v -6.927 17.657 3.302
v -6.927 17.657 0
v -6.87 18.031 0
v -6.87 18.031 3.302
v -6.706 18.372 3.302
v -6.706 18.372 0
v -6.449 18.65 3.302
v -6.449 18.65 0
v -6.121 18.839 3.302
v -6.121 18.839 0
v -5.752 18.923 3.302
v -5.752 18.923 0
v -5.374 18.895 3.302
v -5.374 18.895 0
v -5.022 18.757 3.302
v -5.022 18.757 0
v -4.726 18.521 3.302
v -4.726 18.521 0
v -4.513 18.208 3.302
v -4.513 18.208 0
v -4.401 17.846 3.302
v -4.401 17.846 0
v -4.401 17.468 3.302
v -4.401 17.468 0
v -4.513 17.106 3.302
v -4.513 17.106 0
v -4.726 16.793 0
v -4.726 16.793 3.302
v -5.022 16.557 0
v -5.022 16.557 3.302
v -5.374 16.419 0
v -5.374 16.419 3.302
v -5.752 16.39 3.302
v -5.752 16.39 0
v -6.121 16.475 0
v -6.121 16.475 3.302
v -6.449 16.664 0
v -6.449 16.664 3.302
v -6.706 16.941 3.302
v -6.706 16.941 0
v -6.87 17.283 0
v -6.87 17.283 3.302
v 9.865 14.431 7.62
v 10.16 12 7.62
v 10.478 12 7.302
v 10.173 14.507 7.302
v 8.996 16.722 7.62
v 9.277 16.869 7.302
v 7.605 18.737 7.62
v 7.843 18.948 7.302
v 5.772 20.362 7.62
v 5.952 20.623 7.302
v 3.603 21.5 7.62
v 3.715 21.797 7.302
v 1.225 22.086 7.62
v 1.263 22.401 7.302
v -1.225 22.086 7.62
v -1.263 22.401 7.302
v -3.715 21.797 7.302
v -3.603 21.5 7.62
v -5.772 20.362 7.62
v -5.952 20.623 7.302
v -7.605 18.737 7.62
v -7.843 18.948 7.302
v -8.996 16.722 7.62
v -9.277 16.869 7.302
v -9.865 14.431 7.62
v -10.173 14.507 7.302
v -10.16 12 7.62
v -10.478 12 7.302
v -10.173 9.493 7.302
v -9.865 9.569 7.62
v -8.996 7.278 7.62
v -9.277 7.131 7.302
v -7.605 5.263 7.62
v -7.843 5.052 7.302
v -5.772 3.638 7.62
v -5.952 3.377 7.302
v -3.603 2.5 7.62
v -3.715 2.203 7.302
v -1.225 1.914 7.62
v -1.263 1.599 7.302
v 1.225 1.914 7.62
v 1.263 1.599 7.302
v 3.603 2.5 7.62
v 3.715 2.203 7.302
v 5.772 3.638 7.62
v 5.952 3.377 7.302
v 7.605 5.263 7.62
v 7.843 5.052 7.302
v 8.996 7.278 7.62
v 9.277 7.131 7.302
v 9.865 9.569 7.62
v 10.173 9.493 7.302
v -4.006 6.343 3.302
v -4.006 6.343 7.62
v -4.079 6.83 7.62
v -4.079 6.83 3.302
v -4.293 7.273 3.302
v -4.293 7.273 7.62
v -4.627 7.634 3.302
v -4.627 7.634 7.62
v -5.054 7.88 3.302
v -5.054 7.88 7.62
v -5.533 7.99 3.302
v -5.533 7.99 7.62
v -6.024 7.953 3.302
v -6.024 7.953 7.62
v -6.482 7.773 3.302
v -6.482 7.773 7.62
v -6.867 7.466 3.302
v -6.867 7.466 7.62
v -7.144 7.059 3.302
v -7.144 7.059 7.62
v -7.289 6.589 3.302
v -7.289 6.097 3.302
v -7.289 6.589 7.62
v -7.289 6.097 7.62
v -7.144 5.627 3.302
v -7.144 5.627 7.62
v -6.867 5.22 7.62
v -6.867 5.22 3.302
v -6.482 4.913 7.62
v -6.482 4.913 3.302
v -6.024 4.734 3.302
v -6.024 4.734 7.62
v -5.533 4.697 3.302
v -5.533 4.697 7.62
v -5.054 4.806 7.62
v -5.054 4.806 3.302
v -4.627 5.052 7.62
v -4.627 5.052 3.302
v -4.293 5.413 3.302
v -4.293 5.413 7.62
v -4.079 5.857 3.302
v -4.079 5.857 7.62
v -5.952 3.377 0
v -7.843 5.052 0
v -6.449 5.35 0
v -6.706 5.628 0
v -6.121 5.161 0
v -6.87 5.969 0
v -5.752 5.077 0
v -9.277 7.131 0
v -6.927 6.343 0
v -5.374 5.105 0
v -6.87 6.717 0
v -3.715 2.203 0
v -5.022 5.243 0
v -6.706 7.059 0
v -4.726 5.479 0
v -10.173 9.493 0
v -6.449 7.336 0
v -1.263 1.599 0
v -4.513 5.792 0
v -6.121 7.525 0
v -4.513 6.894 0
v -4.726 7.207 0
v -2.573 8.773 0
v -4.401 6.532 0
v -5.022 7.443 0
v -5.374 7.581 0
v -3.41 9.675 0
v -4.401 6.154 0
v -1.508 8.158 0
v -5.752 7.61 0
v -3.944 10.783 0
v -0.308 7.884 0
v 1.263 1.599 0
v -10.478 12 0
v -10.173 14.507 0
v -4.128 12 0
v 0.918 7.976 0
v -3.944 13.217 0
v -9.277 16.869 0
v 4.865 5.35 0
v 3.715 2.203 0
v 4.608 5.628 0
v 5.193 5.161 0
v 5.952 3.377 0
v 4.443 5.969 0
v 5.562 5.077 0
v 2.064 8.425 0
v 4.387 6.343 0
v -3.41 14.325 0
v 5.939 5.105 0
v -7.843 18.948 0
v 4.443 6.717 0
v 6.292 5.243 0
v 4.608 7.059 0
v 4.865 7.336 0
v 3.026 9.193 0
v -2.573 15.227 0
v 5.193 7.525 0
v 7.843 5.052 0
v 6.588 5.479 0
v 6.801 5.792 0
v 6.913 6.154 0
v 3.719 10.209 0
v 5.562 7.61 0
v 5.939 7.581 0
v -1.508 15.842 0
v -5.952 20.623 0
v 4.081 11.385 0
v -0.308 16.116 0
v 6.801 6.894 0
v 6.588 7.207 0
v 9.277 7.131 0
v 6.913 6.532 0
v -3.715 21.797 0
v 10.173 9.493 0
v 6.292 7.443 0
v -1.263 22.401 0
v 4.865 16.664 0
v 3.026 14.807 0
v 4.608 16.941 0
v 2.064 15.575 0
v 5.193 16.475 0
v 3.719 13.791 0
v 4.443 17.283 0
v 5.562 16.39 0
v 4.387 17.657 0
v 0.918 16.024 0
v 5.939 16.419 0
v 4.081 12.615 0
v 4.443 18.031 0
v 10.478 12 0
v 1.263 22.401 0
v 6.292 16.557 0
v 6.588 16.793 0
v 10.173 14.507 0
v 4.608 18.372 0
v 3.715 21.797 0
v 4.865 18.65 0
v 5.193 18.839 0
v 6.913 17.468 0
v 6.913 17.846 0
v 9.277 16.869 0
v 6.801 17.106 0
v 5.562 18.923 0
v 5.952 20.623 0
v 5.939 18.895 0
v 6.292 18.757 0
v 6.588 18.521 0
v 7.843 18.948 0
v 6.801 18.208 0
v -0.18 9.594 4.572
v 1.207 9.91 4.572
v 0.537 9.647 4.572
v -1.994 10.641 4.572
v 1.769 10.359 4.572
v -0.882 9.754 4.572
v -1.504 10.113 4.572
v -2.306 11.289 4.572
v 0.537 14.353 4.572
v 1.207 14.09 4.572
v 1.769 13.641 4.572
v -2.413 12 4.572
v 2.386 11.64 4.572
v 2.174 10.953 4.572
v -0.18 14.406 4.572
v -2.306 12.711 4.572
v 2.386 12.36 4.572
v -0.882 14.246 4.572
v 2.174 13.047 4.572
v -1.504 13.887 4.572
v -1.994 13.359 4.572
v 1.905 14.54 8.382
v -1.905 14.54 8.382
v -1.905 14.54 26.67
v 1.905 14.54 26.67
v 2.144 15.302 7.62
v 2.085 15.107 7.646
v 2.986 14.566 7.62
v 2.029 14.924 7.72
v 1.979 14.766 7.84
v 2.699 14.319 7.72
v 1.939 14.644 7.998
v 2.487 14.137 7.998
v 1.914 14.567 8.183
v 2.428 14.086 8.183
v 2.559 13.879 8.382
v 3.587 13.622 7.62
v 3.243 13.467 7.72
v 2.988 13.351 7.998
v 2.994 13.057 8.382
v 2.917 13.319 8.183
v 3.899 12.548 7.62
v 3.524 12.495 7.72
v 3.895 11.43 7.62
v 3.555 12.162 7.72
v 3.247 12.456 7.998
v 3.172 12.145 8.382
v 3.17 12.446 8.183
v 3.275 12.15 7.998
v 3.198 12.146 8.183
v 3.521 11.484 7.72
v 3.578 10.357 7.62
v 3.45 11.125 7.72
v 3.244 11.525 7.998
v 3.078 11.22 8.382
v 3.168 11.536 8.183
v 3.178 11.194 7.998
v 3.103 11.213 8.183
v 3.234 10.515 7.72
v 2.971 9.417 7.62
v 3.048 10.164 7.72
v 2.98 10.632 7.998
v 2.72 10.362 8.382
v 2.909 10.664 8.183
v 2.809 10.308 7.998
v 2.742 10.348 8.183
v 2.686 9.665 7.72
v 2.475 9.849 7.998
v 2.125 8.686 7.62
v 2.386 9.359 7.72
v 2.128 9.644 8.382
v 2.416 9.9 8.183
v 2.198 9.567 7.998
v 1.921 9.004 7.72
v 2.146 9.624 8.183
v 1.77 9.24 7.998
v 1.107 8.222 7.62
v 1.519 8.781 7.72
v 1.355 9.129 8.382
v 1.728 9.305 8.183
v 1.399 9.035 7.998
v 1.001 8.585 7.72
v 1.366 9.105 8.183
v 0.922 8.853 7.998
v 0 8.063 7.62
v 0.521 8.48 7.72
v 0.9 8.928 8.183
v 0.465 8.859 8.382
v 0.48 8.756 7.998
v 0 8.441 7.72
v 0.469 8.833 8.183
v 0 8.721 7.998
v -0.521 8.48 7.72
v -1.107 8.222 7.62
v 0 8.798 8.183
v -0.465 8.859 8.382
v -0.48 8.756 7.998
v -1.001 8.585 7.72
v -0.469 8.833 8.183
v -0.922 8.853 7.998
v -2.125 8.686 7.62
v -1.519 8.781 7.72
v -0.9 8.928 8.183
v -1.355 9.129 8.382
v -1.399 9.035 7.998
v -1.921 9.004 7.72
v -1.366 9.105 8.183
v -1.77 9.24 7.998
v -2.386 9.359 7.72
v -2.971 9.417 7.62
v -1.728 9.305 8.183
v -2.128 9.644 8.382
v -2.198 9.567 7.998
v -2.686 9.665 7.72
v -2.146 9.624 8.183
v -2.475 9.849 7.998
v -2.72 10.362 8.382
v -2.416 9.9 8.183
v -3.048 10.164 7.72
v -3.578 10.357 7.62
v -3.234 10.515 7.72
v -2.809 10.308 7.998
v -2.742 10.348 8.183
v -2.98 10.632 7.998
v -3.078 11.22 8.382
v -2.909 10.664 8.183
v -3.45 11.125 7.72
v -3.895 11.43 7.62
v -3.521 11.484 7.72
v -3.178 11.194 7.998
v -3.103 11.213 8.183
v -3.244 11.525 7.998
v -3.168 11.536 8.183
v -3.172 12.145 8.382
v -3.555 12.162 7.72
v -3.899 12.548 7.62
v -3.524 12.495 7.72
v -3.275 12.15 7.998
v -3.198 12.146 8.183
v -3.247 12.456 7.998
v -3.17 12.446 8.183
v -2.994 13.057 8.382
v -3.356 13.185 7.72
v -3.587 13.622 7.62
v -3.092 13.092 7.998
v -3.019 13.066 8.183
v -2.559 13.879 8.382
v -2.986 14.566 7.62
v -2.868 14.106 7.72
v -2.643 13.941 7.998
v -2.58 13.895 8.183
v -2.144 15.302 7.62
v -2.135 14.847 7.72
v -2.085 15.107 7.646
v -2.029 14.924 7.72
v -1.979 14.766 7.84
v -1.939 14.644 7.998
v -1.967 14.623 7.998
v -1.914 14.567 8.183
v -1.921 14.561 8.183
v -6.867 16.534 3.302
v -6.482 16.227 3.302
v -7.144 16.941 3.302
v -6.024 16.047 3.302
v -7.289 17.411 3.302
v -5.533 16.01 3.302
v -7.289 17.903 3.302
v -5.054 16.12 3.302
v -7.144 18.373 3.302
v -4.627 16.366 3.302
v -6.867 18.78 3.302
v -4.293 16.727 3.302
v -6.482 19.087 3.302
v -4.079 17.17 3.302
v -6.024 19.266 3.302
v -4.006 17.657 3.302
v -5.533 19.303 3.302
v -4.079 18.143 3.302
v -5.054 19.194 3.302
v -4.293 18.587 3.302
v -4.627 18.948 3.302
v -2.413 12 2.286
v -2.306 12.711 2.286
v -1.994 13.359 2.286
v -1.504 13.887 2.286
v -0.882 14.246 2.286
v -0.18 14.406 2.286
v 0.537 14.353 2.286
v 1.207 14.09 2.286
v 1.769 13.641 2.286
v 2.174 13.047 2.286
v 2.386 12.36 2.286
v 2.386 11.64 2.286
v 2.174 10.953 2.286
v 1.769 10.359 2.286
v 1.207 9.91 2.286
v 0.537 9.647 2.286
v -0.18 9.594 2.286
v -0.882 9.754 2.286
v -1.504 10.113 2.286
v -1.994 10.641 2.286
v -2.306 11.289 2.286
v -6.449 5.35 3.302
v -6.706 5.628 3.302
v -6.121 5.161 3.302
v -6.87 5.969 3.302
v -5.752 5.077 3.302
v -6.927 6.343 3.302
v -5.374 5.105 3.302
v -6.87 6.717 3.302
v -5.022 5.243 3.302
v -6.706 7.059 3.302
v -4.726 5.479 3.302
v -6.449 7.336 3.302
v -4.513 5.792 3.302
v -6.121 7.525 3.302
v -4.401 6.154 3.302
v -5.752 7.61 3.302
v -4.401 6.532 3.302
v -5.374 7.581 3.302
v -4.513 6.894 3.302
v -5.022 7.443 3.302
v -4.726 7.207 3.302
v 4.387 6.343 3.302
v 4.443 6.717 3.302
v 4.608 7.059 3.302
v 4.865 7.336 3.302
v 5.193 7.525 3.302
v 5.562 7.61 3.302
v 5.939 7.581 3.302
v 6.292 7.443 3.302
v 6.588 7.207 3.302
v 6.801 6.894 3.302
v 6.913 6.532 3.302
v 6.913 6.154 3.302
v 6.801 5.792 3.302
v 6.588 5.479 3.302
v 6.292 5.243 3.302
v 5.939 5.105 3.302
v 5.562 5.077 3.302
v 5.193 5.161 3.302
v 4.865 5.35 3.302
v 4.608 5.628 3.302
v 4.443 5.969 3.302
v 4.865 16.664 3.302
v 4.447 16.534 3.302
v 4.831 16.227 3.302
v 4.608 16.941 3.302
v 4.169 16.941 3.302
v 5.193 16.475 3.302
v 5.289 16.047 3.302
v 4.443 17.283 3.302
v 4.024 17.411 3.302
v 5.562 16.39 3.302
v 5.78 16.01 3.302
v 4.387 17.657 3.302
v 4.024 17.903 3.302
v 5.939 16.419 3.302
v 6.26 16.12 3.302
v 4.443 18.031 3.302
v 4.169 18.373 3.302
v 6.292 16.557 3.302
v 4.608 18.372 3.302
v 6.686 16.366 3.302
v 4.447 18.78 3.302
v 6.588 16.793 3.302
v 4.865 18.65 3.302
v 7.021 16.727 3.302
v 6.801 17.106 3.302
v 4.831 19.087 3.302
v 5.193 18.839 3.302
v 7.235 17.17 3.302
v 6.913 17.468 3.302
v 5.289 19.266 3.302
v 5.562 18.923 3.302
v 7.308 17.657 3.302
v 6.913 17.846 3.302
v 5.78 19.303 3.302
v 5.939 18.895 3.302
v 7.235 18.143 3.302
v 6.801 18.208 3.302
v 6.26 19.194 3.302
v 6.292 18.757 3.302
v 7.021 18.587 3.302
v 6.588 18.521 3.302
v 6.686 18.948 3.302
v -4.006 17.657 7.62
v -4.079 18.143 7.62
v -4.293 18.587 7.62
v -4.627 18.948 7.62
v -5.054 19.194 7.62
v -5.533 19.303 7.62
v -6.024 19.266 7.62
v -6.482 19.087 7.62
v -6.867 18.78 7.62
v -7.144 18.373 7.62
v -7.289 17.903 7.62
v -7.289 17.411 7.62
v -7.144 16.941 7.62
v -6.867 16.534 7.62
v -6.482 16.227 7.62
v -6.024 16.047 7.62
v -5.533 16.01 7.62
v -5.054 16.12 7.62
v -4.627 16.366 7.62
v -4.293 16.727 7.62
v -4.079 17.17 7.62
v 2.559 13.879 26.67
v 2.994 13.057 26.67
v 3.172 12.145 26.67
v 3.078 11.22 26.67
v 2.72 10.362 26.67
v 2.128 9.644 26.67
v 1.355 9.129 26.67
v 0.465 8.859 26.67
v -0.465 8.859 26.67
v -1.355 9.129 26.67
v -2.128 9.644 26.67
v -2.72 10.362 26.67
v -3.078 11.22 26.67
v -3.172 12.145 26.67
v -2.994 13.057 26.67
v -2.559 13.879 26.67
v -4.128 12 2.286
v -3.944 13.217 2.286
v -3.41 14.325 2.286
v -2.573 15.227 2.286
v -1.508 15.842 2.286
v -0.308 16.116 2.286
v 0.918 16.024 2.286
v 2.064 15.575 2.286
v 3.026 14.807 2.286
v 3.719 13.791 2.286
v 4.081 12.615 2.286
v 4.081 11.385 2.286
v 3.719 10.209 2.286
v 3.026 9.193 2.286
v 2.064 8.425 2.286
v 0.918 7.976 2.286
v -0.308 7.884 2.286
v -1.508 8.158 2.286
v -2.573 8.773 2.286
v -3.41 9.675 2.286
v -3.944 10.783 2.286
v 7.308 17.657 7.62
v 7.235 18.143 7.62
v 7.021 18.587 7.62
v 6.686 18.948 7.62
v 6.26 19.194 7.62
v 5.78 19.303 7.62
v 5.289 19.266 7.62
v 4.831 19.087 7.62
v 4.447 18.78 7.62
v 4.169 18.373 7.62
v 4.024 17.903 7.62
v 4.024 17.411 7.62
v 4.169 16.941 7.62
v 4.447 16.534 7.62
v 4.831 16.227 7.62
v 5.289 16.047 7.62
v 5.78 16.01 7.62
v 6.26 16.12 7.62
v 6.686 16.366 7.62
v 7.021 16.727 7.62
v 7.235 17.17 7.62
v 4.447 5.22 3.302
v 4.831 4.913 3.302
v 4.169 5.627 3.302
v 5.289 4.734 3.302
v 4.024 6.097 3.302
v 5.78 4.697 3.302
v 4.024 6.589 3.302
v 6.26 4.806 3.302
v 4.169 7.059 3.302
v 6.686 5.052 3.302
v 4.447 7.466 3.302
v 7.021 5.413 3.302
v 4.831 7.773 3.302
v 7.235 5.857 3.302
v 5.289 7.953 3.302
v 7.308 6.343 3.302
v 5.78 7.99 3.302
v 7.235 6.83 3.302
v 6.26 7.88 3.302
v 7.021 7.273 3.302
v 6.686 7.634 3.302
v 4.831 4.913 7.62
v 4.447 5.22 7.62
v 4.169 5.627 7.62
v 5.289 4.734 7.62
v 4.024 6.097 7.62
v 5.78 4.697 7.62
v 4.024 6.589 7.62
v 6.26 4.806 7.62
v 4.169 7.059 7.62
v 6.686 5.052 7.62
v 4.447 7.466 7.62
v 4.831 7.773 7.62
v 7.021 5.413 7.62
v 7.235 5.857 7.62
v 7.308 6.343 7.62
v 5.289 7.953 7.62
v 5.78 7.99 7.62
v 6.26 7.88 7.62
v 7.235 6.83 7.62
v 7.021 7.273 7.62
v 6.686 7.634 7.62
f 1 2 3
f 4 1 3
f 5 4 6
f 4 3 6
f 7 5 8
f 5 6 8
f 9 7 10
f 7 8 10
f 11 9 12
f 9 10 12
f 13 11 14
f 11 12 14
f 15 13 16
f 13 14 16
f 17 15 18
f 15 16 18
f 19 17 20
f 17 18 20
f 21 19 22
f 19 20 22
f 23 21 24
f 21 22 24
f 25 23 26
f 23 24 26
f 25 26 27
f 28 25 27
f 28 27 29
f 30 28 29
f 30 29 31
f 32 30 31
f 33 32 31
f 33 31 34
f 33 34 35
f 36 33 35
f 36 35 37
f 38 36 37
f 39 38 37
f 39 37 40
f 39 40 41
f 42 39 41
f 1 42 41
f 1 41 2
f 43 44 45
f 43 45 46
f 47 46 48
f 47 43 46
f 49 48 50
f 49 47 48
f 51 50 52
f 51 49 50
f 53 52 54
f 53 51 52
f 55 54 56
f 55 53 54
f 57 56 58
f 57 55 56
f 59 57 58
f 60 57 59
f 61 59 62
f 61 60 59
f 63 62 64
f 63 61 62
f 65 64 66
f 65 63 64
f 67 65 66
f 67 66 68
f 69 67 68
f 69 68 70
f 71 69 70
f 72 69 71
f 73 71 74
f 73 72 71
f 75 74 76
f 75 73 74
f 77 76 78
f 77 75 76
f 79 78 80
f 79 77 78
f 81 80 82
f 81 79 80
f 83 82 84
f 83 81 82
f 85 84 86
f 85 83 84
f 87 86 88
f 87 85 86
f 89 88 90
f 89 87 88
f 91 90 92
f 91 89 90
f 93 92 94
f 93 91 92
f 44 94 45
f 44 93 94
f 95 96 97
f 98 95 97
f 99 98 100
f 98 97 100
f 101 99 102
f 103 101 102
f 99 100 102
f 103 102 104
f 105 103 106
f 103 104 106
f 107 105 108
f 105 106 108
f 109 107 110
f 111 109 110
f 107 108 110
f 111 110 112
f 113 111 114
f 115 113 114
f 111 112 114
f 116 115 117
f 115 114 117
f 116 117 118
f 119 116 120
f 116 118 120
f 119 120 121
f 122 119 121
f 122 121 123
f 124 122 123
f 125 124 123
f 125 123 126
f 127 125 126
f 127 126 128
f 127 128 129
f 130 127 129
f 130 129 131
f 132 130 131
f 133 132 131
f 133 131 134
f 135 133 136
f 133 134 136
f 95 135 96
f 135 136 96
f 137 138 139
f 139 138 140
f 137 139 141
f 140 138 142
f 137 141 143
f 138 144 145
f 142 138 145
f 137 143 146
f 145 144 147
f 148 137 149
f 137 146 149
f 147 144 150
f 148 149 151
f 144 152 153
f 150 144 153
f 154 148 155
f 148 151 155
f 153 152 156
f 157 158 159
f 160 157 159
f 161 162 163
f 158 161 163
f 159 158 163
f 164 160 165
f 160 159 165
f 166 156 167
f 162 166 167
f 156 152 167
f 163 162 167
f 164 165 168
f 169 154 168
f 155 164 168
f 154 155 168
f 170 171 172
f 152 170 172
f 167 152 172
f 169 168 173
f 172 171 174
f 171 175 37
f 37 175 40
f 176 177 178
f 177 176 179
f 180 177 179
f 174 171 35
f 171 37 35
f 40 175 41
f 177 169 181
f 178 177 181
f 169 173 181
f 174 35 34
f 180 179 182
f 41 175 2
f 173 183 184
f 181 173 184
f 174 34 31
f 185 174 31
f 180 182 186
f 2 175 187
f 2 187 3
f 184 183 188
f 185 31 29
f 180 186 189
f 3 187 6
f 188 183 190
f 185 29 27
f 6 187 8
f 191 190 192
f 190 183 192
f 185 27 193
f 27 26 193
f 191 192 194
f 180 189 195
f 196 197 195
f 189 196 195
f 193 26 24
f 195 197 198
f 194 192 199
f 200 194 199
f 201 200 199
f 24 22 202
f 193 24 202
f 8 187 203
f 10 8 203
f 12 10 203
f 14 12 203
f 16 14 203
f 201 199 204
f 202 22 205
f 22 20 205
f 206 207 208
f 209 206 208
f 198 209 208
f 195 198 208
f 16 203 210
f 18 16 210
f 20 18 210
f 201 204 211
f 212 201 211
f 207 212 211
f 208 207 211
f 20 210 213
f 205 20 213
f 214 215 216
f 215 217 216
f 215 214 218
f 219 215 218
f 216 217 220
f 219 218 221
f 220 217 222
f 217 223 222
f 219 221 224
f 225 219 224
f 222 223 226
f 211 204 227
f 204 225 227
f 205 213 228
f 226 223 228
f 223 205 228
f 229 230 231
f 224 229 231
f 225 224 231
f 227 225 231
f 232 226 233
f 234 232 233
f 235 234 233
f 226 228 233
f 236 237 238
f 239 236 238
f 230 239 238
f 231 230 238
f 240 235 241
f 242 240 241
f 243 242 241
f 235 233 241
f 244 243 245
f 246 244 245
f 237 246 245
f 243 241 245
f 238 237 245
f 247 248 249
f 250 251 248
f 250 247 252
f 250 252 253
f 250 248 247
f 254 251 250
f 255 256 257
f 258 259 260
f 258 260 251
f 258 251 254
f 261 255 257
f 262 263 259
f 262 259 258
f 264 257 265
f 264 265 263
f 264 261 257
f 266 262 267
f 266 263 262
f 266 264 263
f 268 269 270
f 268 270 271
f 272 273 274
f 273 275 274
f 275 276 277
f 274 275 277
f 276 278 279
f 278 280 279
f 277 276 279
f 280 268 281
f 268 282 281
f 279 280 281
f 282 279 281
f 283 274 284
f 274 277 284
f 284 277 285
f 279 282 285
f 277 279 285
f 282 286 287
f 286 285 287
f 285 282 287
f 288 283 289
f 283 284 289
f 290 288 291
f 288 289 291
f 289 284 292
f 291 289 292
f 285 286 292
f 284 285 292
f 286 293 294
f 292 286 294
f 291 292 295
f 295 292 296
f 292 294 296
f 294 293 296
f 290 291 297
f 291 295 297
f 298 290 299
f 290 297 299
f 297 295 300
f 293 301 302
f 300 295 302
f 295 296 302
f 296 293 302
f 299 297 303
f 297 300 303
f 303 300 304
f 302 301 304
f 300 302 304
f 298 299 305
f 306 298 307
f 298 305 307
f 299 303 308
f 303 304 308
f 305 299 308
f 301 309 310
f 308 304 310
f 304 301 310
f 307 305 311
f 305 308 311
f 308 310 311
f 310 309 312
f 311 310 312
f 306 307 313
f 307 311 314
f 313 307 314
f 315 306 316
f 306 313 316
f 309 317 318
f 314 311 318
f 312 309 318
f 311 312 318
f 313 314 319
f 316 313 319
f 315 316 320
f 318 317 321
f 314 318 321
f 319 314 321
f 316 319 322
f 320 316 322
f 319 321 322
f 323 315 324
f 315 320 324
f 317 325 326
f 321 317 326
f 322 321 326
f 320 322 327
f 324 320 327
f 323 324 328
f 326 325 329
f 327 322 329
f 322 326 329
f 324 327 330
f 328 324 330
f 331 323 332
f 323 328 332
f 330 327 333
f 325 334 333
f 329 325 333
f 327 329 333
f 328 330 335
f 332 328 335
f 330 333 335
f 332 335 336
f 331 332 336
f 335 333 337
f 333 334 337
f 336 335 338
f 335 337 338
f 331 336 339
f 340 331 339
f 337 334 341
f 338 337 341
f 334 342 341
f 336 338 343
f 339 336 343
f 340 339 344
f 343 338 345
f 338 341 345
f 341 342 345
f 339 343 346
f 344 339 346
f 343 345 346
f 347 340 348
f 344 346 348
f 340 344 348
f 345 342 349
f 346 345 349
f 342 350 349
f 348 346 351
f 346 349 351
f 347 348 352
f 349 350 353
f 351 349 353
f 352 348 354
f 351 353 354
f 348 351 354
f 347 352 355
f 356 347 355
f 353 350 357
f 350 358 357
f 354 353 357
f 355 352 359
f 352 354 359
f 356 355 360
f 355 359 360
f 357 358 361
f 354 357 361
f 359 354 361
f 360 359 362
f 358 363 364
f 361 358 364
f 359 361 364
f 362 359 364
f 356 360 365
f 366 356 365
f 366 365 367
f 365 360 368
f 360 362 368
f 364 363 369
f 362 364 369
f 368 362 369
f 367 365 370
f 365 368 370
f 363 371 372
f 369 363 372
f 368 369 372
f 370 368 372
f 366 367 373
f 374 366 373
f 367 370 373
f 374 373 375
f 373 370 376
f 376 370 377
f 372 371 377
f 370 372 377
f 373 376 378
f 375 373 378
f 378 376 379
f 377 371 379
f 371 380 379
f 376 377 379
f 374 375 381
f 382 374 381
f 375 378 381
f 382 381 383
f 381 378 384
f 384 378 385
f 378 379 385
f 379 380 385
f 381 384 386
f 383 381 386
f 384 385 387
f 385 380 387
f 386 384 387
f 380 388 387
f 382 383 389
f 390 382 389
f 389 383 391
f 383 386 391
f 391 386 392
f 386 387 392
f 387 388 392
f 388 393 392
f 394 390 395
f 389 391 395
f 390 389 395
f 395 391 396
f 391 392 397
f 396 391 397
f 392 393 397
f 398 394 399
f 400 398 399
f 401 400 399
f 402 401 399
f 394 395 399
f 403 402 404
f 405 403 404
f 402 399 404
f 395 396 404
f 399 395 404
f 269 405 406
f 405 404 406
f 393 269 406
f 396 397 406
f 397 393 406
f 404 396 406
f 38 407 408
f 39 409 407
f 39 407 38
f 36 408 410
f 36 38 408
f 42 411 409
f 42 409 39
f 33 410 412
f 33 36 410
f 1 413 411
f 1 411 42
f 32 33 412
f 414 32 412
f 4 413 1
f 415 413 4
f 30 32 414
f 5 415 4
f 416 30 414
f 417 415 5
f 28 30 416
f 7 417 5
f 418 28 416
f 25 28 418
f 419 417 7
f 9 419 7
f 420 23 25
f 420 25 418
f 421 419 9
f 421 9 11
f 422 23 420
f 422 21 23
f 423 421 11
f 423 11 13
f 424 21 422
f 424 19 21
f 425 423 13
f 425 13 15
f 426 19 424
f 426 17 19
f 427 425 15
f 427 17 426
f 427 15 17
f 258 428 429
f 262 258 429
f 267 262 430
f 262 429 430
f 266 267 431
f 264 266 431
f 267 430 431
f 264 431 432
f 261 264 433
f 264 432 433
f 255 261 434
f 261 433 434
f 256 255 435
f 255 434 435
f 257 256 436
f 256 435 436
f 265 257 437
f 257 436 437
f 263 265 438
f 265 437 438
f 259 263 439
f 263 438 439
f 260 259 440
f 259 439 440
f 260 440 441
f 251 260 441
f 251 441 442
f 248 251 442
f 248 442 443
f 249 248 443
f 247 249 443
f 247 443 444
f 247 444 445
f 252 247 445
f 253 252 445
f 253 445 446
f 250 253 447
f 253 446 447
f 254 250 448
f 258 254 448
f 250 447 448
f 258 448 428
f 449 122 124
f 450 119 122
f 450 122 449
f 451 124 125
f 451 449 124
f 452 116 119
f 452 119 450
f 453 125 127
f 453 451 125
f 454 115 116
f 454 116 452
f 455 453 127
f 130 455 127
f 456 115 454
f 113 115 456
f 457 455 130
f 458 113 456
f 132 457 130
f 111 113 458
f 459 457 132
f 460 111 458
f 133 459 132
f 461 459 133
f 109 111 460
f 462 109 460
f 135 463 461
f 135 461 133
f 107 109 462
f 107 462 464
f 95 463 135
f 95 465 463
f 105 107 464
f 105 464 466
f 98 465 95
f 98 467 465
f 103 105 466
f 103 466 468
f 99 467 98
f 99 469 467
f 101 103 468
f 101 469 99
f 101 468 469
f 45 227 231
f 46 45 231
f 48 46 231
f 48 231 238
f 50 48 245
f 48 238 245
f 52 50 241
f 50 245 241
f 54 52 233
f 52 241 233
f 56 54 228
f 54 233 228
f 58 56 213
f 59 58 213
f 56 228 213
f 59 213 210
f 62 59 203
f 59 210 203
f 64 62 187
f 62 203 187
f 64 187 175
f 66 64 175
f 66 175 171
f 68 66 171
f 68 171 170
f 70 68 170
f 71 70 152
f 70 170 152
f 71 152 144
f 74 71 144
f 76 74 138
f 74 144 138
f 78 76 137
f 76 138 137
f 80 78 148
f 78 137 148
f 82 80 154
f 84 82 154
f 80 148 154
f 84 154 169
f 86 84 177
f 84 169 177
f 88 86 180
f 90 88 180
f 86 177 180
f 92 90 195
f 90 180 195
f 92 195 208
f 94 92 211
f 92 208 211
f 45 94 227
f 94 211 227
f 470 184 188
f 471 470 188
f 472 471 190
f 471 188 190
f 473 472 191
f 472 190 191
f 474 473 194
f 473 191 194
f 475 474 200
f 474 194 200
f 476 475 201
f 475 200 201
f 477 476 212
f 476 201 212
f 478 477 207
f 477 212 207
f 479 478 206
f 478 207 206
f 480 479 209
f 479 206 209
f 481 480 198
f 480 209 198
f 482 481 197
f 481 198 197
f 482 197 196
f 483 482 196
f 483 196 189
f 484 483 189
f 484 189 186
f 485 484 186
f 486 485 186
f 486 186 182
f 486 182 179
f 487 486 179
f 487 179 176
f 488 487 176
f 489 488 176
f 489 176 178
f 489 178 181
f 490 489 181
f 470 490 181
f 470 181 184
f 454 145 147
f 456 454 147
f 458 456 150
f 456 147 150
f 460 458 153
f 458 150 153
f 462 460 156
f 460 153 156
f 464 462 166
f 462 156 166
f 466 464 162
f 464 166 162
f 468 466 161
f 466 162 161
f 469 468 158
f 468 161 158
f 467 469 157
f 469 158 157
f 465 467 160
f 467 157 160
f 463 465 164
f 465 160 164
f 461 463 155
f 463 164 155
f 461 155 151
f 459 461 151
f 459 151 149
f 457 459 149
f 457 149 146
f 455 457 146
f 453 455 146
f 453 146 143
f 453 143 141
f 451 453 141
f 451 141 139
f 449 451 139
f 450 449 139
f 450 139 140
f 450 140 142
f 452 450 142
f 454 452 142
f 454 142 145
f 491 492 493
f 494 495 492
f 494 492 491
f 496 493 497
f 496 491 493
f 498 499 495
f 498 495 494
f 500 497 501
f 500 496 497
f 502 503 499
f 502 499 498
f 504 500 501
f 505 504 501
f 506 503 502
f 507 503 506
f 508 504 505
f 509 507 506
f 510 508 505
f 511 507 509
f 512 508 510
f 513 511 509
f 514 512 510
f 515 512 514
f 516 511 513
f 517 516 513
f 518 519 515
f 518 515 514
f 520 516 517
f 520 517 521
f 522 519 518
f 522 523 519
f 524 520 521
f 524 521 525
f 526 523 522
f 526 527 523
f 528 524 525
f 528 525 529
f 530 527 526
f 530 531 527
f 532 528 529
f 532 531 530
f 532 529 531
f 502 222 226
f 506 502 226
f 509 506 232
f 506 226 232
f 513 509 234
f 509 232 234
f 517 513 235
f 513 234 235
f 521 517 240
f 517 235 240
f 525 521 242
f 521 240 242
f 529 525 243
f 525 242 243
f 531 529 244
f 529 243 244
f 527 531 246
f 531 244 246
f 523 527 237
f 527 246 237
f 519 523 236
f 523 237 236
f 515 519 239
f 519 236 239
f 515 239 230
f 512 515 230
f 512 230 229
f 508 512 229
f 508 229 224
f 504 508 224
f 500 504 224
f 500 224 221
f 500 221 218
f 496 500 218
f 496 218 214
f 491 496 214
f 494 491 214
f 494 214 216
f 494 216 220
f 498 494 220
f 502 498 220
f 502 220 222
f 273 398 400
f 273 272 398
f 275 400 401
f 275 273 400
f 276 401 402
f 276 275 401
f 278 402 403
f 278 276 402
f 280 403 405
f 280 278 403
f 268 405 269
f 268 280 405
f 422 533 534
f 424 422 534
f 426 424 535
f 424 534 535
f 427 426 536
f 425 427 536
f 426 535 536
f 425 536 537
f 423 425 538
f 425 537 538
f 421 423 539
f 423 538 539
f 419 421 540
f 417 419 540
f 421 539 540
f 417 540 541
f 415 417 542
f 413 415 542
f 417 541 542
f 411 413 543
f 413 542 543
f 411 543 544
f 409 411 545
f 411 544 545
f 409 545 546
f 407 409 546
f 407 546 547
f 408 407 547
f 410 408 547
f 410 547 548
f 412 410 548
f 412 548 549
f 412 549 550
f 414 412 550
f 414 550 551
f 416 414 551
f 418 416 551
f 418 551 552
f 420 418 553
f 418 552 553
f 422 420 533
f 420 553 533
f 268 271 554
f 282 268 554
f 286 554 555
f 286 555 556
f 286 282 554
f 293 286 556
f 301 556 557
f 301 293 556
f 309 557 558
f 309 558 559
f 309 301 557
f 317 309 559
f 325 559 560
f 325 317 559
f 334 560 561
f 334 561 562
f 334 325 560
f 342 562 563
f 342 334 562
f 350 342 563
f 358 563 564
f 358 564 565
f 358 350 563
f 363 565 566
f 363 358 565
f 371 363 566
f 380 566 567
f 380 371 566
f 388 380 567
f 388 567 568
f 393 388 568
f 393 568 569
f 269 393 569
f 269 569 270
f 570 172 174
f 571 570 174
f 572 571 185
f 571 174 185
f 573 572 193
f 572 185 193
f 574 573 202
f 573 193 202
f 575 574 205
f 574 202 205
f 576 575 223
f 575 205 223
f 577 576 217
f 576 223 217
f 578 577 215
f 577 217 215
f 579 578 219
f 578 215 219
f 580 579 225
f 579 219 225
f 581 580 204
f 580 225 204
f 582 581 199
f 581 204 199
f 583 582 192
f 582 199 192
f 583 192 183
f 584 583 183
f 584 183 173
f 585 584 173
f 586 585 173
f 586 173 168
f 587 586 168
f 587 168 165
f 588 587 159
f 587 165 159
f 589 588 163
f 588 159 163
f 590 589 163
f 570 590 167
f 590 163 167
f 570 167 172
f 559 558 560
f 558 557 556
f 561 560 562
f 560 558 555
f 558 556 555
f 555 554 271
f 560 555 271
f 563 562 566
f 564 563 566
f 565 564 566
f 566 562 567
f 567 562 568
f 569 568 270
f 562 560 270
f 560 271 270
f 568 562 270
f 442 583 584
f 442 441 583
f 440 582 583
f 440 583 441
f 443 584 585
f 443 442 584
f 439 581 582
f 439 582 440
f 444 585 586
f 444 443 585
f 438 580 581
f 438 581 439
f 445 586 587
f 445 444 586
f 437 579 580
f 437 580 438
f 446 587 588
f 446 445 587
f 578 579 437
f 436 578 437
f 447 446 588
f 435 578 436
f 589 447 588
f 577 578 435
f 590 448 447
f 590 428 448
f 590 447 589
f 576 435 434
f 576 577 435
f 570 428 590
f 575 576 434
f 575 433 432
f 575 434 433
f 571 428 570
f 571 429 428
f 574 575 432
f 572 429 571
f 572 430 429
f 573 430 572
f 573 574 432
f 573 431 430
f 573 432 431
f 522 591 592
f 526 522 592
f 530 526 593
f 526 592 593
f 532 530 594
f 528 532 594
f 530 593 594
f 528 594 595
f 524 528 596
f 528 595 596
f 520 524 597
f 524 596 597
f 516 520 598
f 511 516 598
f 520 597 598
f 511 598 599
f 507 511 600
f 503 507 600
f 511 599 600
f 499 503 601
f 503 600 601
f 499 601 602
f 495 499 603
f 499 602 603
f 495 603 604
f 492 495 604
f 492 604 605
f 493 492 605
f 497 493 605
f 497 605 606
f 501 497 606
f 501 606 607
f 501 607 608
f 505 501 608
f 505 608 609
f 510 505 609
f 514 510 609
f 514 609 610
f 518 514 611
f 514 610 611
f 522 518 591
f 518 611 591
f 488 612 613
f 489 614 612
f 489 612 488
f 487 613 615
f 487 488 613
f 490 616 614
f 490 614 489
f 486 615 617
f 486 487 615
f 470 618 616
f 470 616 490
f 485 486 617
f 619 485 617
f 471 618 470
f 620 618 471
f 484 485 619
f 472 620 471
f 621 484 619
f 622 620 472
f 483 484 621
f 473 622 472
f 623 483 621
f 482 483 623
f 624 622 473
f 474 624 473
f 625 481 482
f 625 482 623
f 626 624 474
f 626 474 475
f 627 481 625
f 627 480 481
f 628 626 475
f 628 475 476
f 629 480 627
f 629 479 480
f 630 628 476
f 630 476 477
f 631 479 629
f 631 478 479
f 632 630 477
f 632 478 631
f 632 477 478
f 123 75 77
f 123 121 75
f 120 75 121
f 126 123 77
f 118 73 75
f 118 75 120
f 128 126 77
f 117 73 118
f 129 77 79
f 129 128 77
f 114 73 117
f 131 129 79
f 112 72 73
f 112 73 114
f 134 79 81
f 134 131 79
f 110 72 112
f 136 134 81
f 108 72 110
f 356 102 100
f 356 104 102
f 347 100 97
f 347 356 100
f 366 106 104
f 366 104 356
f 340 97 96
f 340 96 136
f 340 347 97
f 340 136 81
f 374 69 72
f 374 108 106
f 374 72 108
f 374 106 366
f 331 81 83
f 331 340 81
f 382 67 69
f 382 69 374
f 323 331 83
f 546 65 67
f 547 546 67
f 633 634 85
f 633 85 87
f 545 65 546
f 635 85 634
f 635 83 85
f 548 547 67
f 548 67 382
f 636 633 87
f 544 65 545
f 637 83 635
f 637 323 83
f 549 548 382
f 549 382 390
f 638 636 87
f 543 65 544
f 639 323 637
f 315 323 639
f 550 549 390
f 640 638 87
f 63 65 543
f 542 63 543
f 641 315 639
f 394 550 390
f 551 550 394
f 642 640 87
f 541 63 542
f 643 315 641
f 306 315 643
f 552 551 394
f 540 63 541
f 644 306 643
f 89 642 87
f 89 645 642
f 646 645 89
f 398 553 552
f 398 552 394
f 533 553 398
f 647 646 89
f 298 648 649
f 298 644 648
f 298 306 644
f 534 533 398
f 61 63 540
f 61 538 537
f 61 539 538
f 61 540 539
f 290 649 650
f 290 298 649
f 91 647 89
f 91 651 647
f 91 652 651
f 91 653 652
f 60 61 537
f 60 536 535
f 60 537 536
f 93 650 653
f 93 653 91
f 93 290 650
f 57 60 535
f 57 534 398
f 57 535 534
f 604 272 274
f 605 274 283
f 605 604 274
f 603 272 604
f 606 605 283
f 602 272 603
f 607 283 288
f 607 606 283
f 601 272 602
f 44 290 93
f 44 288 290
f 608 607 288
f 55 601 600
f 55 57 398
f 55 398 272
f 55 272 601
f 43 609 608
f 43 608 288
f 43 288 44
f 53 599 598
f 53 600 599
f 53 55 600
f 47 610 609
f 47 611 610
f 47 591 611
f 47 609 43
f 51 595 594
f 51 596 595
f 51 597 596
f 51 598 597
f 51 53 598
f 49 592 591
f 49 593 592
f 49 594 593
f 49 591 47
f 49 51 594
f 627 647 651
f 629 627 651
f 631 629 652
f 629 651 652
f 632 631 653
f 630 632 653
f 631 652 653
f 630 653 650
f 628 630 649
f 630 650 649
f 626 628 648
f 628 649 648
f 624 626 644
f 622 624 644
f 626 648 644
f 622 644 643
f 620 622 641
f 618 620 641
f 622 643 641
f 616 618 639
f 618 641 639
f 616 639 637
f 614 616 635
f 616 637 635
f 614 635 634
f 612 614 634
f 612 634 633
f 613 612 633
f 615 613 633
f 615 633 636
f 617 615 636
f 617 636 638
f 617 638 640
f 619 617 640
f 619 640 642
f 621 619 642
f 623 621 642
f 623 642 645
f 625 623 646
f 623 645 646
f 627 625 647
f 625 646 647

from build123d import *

# Parameters (mm, degrees)
ESQUISSE1_R                  = 10.4775
BOSS_EXTRU_1_DEPTH           = 7.62
ESQUISSE3_R                  = 4.1275
ENL_V_MAT_EXTRU_1_DEPTH      = 2.286
ESQUISSE4_R                  = 2.413
ENL_V_MAT_EXTRU_2_DEPTH      = 2.286
BOSS_EXTRU_2_DEPTH           = 19.05
ESQUISSE6_R                  = 1.27
ENL_V_MAT_EXTRU_3_DEPTH      = 1
ENL_V_MAT_EXTRU_3_DEPTH_BACK = 27.67
ESQUISSE7_R                  = 1.651
ENL_V_MAT_EXTRU_4_DEPTH      = 4.318
CHANFREIN1_SIZE              = 0.3175
CONG_1_R                     = 0.762


with BuildPart() as part:
    # Esquisse1 → Boss.-Extru.1 (new body)
    with BuildSketch(Plane.XY):
        with Locations((0, 12)):
            Circle(ESQUISSE1_R)
    extrude(amount=BOSS_EXTRU_1_DEPTH)

    # Esquisse3 → Enlèv. mat.-Extru.1 (cut)
    with BuildSketch(Plane(origin=(0, 0, 0), x_dir=(-1, 0, 0), z_dir=(0, 0, -1))):
        with Locations((0, 12)):
            Circle(ESQUISSE3_R)
    extrude(amount=-ENL_V_MAT_EXTRU_1_DEPTH, mode=Mode.SUBTRACT)

    # Esquisse4 → Enlèv. mat.-Extru.2 (cut)
    with BuildSketch(Plane(origin=(0, 0, 2.286), x_dir=(-1, 0, 0), z_dir=(0, 0, -1))):
        with Locations((0, 12)):
            Circle(ESQUISSE4_R)
    extrude(amount=-ENL_V_MAT_EXTRU_2_DEPTH, mode=Mode.SUBTRACT)

    # Esquisse5 → Boss.-Extru.2 (add)
    with BuildSketch(Plane.XY.offset(7.62)):
        with BuildLine():
            Line((-1.905, 14.54), (1.905, 14.54))
            ThreePointArc((1.905, 14.54), (0, 8.825), (-1.905, 14.54))
        make_face()
    extrude(amount=BOSS_EXTRU_2_DEPTH)

    # Esquisse6 → Enlèv. mat.-Extru.3 (cut, two sides)
    with BuildSketch(Plane(origin=(0, 0, 0), x_dir=(-1, 0, 0), z_dir=(0, 0, -1))) as enl_v_mat_extru_3_sk:
        with Locations((-5.656854249, 17.656854249)):
            Circle(ESQUISSE6_R)
        with Locations((5.656854249, 17.656854249)):
            Circle(ESQUISSE6_R)
        with Locations((5.656854249, 6.343145751)):
            Circle(ESQUISSE6_R)
        with Locations((-5.656854249, 6.343145751)):
            Circle(ESQUISSE6_R)
    extrude(amount=ENL_V_MAT_EXTRU_3_DEPTH, mode=Mode.SUBTRACT)
    extrude(enl_v_mat_extru_3_sk.sketch, amount=-ENL_V_MAT_EXTRU_3_DEPTH_BACK, mode=Mode.SUBTRACT)

    # Esquisse7 → Enlèv. mat.-Extru.4 (cut)
    with BuildSketch(Plane.XY.offset(7.62)):
        with Locations((-5.656854249, 17.656854249)):
            Circle(ESQUISSE7_R)
        with Locations((5.656854249, 17.656854249)):
            Circle(ESQUISSE7_R)
        with Locations((5.656854249, 6.343145751)):
            Circle(ESQUISSE7_R)
        with Locations((-5.656854249, 6.343145751)):
            Circle(ESQUISSE7_R)
    extrude(amount=-ENL_V_MAT_EXTRU_4_DEPTH, mode=Mode.SUBTRACT)

    # Chanfrein1
    chanfrein1_edges = [part.edges().sort_by_distance(p)[0] for p in [
        (-10.4775, 12, 7.62),
    ]]
    chamfer(chanfrein1_edges, length=CHANFREIN1_SIZE)

    # Congé1
    cong_1_edges = [part.edges().sort_by_distance(p)[0] for p in [
        (0, 8.825, 7.62),
        (0, 14.54, 7.62),
    ]]
    fillet(cong_1_edges, radius=CONG_1_R)


solid = part.part
